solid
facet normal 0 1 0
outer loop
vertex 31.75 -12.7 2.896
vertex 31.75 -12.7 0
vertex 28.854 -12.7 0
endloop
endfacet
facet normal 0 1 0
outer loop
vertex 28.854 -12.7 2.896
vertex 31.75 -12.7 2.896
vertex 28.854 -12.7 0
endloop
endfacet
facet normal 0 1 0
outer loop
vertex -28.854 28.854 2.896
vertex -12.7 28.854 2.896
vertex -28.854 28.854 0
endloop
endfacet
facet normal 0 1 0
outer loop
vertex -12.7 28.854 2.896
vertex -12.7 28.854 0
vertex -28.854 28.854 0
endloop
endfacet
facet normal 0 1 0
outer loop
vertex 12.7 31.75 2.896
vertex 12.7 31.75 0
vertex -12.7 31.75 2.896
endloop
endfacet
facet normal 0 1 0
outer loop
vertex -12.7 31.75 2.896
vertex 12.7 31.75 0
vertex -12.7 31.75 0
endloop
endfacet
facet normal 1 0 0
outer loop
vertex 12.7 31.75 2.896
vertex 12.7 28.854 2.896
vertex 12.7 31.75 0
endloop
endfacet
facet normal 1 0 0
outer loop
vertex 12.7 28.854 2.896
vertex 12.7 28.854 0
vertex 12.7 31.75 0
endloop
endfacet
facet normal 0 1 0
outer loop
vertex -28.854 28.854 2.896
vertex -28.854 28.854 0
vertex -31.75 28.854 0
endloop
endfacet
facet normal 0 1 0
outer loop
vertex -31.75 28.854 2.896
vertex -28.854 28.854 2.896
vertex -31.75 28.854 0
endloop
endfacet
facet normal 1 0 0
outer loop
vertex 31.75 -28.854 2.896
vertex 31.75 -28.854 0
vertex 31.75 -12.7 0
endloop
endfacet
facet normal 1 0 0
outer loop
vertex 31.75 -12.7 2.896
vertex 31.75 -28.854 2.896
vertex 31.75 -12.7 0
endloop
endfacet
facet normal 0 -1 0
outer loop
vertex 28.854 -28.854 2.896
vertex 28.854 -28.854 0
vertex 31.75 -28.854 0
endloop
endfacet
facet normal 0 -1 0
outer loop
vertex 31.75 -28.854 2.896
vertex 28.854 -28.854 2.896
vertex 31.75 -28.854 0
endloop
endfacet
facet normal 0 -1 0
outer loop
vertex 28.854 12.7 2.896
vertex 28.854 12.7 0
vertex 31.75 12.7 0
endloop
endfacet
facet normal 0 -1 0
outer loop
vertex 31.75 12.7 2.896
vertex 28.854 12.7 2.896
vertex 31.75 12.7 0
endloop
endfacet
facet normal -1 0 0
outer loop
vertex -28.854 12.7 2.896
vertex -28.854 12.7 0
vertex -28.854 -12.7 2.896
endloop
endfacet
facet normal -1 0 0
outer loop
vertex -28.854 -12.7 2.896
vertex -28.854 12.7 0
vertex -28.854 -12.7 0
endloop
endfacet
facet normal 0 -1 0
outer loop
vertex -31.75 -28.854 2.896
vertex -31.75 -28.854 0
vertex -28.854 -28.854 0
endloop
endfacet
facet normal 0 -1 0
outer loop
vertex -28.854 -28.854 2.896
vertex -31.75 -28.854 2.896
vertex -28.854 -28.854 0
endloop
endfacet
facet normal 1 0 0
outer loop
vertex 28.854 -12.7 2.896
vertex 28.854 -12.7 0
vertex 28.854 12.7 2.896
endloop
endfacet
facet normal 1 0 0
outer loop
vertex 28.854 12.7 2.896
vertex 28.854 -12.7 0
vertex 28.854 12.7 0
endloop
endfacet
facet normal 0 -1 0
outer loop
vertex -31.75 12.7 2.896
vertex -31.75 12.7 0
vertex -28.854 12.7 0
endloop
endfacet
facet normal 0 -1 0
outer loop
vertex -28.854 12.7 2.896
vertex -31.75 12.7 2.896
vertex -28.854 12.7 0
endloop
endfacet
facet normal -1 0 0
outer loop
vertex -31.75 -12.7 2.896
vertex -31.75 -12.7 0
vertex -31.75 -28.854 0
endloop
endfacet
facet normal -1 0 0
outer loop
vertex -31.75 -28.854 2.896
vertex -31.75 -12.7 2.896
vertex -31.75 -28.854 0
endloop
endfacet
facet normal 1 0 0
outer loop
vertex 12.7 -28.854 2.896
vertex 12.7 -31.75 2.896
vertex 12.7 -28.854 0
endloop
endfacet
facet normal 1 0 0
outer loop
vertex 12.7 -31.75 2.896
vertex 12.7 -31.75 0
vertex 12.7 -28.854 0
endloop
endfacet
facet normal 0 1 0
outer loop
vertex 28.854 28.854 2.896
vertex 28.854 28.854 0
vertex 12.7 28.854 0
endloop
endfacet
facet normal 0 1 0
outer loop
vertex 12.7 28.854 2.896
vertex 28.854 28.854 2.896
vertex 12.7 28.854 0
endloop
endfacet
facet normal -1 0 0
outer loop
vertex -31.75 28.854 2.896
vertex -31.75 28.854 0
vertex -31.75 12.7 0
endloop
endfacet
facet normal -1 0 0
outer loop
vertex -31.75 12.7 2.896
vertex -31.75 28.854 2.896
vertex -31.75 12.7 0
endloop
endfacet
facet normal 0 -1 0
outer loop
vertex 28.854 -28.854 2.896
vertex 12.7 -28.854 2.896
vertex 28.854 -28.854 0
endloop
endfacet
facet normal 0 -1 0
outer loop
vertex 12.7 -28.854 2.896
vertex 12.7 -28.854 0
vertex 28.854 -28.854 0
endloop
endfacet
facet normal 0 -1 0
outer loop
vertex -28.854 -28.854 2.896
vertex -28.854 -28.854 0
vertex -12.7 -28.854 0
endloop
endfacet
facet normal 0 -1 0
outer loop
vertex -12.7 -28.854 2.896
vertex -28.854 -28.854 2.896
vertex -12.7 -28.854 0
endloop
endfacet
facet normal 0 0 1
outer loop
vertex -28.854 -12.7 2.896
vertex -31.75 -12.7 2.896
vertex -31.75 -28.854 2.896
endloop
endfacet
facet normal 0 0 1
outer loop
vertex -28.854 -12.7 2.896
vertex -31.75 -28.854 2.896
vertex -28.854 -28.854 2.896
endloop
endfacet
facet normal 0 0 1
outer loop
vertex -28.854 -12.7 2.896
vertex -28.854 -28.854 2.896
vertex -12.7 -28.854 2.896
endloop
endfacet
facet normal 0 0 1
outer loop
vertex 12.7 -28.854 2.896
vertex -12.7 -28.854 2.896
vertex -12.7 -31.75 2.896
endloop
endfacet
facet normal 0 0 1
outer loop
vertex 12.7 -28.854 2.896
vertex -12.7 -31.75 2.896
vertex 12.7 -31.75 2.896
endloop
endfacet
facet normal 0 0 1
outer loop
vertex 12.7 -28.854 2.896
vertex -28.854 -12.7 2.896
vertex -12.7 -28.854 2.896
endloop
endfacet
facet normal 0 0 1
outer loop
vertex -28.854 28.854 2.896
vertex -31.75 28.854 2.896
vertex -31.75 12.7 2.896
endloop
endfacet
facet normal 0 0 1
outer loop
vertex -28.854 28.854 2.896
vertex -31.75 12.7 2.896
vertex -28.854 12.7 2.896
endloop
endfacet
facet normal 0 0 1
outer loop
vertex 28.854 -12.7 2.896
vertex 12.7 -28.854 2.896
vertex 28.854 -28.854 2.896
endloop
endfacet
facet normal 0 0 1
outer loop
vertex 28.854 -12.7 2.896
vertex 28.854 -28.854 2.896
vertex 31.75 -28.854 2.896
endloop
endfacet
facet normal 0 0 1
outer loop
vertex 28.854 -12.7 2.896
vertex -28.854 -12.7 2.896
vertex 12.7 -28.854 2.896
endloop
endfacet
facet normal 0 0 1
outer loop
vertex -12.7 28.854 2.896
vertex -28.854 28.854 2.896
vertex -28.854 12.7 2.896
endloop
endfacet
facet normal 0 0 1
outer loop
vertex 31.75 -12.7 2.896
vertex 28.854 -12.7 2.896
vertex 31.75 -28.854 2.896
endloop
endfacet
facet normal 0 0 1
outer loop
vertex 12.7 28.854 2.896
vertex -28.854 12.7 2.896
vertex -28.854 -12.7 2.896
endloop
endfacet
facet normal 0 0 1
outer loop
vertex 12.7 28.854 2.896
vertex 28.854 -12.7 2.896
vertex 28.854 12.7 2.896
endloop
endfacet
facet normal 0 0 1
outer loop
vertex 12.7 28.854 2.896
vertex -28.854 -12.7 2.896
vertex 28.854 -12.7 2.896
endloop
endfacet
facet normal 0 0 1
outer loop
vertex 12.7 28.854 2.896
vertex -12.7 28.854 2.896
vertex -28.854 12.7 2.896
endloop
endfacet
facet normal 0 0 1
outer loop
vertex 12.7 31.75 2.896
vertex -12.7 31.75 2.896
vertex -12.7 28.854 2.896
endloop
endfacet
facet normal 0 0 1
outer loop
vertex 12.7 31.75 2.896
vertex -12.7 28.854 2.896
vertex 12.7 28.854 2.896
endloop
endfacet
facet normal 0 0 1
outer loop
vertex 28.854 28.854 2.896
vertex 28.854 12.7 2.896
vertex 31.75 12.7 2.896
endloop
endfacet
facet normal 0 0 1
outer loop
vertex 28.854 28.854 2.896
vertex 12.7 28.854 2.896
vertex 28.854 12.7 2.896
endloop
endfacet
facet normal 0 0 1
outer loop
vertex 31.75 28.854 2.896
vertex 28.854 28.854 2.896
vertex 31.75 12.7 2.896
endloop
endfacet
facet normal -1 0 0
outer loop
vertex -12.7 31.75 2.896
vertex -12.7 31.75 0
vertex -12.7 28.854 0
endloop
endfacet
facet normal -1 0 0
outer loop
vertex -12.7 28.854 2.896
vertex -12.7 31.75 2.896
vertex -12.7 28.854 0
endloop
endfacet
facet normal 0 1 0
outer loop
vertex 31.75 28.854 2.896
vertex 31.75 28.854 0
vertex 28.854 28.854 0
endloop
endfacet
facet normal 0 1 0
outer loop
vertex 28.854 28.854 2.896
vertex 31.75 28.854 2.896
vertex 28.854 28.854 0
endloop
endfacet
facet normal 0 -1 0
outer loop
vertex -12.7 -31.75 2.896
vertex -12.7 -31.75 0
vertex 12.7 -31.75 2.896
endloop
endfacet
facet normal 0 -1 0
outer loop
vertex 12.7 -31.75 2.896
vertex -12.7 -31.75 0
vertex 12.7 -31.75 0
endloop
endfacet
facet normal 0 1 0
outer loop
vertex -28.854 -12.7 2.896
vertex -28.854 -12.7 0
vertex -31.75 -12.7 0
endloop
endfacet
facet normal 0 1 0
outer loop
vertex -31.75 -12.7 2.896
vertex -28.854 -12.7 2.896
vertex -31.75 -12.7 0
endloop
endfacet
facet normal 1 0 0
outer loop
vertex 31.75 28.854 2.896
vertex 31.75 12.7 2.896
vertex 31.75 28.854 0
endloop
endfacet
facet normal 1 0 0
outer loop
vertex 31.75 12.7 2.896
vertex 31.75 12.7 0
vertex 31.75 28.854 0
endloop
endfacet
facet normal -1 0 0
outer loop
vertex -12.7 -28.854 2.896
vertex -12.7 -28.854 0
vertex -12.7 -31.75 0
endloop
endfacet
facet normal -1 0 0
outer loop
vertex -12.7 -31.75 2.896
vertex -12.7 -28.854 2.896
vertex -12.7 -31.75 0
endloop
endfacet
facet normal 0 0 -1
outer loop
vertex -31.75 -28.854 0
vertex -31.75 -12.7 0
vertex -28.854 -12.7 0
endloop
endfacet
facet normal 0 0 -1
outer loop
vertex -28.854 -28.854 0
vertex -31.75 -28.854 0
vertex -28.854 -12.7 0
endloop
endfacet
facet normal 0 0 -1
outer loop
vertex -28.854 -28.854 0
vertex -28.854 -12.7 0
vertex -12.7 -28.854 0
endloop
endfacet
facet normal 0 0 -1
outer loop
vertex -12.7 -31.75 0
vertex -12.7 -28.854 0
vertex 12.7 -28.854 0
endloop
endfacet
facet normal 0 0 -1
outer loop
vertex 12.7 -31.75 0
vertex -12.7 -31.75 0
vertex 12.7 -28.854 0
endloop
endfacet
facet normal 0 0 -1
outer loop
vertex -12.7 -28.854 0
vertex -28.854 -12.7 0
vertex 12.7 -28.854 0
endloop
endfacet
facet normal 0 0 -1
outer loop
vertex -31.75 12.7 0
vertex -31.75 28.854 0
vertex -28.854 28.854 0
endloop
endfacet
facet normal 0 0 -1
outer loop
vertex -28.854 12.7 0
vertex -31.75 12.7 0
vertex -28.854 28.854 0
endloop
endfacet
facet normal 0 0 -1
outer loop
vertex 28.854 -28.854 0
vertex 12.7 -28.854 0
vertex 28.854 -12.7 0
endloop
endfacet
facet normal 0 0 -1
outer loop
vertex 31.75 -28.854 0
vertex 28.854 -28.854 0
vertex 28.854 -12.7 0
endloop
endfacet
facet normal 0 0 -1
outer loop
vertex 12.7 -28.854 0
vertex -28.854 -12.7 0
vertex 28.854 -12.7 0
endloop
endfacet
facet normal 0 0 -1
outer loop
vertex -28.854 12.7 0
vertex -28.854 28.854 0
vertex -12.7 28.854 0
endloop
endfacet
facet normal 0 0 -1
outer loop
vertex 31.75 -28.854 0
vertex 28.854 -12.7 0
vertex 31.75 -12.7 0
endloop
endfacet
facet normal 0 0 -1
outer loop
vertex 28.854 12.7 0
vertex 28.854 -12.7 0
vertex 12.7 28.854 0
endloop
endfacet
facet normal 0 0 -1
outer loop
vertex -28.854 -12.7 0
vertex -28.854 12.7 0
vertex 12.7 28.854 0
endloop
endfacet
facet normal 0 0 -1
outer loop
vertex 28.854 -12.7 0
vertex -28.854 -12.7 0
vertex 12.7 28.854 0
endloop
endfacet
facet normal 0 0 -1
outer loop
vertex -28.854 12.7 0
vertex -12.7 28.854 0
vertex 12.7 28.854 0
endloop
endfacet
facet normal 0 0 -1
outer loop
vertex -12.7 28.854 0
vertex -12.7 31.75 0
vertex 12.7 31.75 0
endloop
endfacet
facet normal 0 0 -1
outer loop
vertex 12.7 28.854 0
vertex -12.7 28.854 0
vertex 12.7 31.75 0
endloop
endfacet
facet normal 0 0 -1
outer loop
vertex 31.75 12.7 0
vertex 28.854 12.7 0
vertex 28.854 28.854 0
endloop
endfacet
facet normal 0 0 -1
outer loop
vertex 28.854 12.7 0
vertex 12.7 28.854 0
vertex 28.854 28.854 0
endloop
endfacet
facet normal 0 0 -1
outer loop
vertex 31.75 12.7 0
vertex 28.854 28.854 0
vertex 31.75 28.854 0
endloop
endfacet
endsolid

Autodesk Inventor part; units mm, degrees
ref_plane "YZ Plane" through (0, 0, 0) normal (1, 0, 0) x (0, 1, 0)
ref_plane "XZ Plane" through (0, 0, 0) normal (0, 1, 0) x (-1, 0, 0)
ref_plane "XY Plane" through (0, 0, 0) normal (0, 0, 1) x (1, 0, 0)
sketch "Sketch1" plane through (0, 0, 0) normal (0, 0, 1) x (1, 0, 0)
  line L0 (-12.7, 28.8544) -> (-28.8544, 28.8544)
  line L1 (-28.8544, 28.8544) -> (-31.75, 28.8544)
  line L2 (-31.75, 28.8544) -> (-31.75, 12.7)
  line L3 (-31.75, 12.7) -> (-28.8544, 12.7)
  line L4 (-28.8544, 12.7) -> (-28.8544, -12.7)
  line L5 (-28.8544, -12.7) -> (-31.75, -12.7)
  line L6 (-31.75, -12.7) -> (-31.75, -28.8544)
  line L7 (-31.75, -28.8544) -> (-28.8544, -28.8544)
  line L8 (-28.8544, -28.8544) -> (-12.7, -28.8544)
  line L9 (-12.7, -28.8544) -> (-12.7, -31.75)
  line L10 (-12.7, -31.75) -> (12.7, -31.75)
  line L11 (12.7, -31.75) -> (12.7, -28.8544)
  line L12 (12.7, -28.8544) -> (28.8544, -28.8544)
  line L13 (28.8544, -28.8544) -> (31.75, -28.8544)
  line L14 (31.75, -28.8544) -> (31.75, -12.7)
  line L15 (31.75, -12.7) -> (28.8544, -12.7)
  line L16 (28.8544, -12.7) -> (28.8544, 12.7)
  line L17 (28.8544, 12.7) -> (31.75, 12.7)
  line L18 (31.75, 12.7) -> (31.75, 28.8544)
  line L19 (31.75, 28.8544) -> (28.8544, 28.8544)
  line L20 (28.8544, 28.8544) -> (12.7, 28.8544)
  line L21 (12.7, 28.8544) -> (12.7, 31.75)
  line L22 (12.7, 31.75) -> (-12.7, 31.75)
  line L23 (-12.7, 31.75) -> (-12.7, 28.8544)
  point P0 (0, 0)
extrude "Extrusion1" add sketch "Sketch1" along normal blind 2.8956
properties part number "inside_box_left_right" material "Polycarbonate, Clear"
